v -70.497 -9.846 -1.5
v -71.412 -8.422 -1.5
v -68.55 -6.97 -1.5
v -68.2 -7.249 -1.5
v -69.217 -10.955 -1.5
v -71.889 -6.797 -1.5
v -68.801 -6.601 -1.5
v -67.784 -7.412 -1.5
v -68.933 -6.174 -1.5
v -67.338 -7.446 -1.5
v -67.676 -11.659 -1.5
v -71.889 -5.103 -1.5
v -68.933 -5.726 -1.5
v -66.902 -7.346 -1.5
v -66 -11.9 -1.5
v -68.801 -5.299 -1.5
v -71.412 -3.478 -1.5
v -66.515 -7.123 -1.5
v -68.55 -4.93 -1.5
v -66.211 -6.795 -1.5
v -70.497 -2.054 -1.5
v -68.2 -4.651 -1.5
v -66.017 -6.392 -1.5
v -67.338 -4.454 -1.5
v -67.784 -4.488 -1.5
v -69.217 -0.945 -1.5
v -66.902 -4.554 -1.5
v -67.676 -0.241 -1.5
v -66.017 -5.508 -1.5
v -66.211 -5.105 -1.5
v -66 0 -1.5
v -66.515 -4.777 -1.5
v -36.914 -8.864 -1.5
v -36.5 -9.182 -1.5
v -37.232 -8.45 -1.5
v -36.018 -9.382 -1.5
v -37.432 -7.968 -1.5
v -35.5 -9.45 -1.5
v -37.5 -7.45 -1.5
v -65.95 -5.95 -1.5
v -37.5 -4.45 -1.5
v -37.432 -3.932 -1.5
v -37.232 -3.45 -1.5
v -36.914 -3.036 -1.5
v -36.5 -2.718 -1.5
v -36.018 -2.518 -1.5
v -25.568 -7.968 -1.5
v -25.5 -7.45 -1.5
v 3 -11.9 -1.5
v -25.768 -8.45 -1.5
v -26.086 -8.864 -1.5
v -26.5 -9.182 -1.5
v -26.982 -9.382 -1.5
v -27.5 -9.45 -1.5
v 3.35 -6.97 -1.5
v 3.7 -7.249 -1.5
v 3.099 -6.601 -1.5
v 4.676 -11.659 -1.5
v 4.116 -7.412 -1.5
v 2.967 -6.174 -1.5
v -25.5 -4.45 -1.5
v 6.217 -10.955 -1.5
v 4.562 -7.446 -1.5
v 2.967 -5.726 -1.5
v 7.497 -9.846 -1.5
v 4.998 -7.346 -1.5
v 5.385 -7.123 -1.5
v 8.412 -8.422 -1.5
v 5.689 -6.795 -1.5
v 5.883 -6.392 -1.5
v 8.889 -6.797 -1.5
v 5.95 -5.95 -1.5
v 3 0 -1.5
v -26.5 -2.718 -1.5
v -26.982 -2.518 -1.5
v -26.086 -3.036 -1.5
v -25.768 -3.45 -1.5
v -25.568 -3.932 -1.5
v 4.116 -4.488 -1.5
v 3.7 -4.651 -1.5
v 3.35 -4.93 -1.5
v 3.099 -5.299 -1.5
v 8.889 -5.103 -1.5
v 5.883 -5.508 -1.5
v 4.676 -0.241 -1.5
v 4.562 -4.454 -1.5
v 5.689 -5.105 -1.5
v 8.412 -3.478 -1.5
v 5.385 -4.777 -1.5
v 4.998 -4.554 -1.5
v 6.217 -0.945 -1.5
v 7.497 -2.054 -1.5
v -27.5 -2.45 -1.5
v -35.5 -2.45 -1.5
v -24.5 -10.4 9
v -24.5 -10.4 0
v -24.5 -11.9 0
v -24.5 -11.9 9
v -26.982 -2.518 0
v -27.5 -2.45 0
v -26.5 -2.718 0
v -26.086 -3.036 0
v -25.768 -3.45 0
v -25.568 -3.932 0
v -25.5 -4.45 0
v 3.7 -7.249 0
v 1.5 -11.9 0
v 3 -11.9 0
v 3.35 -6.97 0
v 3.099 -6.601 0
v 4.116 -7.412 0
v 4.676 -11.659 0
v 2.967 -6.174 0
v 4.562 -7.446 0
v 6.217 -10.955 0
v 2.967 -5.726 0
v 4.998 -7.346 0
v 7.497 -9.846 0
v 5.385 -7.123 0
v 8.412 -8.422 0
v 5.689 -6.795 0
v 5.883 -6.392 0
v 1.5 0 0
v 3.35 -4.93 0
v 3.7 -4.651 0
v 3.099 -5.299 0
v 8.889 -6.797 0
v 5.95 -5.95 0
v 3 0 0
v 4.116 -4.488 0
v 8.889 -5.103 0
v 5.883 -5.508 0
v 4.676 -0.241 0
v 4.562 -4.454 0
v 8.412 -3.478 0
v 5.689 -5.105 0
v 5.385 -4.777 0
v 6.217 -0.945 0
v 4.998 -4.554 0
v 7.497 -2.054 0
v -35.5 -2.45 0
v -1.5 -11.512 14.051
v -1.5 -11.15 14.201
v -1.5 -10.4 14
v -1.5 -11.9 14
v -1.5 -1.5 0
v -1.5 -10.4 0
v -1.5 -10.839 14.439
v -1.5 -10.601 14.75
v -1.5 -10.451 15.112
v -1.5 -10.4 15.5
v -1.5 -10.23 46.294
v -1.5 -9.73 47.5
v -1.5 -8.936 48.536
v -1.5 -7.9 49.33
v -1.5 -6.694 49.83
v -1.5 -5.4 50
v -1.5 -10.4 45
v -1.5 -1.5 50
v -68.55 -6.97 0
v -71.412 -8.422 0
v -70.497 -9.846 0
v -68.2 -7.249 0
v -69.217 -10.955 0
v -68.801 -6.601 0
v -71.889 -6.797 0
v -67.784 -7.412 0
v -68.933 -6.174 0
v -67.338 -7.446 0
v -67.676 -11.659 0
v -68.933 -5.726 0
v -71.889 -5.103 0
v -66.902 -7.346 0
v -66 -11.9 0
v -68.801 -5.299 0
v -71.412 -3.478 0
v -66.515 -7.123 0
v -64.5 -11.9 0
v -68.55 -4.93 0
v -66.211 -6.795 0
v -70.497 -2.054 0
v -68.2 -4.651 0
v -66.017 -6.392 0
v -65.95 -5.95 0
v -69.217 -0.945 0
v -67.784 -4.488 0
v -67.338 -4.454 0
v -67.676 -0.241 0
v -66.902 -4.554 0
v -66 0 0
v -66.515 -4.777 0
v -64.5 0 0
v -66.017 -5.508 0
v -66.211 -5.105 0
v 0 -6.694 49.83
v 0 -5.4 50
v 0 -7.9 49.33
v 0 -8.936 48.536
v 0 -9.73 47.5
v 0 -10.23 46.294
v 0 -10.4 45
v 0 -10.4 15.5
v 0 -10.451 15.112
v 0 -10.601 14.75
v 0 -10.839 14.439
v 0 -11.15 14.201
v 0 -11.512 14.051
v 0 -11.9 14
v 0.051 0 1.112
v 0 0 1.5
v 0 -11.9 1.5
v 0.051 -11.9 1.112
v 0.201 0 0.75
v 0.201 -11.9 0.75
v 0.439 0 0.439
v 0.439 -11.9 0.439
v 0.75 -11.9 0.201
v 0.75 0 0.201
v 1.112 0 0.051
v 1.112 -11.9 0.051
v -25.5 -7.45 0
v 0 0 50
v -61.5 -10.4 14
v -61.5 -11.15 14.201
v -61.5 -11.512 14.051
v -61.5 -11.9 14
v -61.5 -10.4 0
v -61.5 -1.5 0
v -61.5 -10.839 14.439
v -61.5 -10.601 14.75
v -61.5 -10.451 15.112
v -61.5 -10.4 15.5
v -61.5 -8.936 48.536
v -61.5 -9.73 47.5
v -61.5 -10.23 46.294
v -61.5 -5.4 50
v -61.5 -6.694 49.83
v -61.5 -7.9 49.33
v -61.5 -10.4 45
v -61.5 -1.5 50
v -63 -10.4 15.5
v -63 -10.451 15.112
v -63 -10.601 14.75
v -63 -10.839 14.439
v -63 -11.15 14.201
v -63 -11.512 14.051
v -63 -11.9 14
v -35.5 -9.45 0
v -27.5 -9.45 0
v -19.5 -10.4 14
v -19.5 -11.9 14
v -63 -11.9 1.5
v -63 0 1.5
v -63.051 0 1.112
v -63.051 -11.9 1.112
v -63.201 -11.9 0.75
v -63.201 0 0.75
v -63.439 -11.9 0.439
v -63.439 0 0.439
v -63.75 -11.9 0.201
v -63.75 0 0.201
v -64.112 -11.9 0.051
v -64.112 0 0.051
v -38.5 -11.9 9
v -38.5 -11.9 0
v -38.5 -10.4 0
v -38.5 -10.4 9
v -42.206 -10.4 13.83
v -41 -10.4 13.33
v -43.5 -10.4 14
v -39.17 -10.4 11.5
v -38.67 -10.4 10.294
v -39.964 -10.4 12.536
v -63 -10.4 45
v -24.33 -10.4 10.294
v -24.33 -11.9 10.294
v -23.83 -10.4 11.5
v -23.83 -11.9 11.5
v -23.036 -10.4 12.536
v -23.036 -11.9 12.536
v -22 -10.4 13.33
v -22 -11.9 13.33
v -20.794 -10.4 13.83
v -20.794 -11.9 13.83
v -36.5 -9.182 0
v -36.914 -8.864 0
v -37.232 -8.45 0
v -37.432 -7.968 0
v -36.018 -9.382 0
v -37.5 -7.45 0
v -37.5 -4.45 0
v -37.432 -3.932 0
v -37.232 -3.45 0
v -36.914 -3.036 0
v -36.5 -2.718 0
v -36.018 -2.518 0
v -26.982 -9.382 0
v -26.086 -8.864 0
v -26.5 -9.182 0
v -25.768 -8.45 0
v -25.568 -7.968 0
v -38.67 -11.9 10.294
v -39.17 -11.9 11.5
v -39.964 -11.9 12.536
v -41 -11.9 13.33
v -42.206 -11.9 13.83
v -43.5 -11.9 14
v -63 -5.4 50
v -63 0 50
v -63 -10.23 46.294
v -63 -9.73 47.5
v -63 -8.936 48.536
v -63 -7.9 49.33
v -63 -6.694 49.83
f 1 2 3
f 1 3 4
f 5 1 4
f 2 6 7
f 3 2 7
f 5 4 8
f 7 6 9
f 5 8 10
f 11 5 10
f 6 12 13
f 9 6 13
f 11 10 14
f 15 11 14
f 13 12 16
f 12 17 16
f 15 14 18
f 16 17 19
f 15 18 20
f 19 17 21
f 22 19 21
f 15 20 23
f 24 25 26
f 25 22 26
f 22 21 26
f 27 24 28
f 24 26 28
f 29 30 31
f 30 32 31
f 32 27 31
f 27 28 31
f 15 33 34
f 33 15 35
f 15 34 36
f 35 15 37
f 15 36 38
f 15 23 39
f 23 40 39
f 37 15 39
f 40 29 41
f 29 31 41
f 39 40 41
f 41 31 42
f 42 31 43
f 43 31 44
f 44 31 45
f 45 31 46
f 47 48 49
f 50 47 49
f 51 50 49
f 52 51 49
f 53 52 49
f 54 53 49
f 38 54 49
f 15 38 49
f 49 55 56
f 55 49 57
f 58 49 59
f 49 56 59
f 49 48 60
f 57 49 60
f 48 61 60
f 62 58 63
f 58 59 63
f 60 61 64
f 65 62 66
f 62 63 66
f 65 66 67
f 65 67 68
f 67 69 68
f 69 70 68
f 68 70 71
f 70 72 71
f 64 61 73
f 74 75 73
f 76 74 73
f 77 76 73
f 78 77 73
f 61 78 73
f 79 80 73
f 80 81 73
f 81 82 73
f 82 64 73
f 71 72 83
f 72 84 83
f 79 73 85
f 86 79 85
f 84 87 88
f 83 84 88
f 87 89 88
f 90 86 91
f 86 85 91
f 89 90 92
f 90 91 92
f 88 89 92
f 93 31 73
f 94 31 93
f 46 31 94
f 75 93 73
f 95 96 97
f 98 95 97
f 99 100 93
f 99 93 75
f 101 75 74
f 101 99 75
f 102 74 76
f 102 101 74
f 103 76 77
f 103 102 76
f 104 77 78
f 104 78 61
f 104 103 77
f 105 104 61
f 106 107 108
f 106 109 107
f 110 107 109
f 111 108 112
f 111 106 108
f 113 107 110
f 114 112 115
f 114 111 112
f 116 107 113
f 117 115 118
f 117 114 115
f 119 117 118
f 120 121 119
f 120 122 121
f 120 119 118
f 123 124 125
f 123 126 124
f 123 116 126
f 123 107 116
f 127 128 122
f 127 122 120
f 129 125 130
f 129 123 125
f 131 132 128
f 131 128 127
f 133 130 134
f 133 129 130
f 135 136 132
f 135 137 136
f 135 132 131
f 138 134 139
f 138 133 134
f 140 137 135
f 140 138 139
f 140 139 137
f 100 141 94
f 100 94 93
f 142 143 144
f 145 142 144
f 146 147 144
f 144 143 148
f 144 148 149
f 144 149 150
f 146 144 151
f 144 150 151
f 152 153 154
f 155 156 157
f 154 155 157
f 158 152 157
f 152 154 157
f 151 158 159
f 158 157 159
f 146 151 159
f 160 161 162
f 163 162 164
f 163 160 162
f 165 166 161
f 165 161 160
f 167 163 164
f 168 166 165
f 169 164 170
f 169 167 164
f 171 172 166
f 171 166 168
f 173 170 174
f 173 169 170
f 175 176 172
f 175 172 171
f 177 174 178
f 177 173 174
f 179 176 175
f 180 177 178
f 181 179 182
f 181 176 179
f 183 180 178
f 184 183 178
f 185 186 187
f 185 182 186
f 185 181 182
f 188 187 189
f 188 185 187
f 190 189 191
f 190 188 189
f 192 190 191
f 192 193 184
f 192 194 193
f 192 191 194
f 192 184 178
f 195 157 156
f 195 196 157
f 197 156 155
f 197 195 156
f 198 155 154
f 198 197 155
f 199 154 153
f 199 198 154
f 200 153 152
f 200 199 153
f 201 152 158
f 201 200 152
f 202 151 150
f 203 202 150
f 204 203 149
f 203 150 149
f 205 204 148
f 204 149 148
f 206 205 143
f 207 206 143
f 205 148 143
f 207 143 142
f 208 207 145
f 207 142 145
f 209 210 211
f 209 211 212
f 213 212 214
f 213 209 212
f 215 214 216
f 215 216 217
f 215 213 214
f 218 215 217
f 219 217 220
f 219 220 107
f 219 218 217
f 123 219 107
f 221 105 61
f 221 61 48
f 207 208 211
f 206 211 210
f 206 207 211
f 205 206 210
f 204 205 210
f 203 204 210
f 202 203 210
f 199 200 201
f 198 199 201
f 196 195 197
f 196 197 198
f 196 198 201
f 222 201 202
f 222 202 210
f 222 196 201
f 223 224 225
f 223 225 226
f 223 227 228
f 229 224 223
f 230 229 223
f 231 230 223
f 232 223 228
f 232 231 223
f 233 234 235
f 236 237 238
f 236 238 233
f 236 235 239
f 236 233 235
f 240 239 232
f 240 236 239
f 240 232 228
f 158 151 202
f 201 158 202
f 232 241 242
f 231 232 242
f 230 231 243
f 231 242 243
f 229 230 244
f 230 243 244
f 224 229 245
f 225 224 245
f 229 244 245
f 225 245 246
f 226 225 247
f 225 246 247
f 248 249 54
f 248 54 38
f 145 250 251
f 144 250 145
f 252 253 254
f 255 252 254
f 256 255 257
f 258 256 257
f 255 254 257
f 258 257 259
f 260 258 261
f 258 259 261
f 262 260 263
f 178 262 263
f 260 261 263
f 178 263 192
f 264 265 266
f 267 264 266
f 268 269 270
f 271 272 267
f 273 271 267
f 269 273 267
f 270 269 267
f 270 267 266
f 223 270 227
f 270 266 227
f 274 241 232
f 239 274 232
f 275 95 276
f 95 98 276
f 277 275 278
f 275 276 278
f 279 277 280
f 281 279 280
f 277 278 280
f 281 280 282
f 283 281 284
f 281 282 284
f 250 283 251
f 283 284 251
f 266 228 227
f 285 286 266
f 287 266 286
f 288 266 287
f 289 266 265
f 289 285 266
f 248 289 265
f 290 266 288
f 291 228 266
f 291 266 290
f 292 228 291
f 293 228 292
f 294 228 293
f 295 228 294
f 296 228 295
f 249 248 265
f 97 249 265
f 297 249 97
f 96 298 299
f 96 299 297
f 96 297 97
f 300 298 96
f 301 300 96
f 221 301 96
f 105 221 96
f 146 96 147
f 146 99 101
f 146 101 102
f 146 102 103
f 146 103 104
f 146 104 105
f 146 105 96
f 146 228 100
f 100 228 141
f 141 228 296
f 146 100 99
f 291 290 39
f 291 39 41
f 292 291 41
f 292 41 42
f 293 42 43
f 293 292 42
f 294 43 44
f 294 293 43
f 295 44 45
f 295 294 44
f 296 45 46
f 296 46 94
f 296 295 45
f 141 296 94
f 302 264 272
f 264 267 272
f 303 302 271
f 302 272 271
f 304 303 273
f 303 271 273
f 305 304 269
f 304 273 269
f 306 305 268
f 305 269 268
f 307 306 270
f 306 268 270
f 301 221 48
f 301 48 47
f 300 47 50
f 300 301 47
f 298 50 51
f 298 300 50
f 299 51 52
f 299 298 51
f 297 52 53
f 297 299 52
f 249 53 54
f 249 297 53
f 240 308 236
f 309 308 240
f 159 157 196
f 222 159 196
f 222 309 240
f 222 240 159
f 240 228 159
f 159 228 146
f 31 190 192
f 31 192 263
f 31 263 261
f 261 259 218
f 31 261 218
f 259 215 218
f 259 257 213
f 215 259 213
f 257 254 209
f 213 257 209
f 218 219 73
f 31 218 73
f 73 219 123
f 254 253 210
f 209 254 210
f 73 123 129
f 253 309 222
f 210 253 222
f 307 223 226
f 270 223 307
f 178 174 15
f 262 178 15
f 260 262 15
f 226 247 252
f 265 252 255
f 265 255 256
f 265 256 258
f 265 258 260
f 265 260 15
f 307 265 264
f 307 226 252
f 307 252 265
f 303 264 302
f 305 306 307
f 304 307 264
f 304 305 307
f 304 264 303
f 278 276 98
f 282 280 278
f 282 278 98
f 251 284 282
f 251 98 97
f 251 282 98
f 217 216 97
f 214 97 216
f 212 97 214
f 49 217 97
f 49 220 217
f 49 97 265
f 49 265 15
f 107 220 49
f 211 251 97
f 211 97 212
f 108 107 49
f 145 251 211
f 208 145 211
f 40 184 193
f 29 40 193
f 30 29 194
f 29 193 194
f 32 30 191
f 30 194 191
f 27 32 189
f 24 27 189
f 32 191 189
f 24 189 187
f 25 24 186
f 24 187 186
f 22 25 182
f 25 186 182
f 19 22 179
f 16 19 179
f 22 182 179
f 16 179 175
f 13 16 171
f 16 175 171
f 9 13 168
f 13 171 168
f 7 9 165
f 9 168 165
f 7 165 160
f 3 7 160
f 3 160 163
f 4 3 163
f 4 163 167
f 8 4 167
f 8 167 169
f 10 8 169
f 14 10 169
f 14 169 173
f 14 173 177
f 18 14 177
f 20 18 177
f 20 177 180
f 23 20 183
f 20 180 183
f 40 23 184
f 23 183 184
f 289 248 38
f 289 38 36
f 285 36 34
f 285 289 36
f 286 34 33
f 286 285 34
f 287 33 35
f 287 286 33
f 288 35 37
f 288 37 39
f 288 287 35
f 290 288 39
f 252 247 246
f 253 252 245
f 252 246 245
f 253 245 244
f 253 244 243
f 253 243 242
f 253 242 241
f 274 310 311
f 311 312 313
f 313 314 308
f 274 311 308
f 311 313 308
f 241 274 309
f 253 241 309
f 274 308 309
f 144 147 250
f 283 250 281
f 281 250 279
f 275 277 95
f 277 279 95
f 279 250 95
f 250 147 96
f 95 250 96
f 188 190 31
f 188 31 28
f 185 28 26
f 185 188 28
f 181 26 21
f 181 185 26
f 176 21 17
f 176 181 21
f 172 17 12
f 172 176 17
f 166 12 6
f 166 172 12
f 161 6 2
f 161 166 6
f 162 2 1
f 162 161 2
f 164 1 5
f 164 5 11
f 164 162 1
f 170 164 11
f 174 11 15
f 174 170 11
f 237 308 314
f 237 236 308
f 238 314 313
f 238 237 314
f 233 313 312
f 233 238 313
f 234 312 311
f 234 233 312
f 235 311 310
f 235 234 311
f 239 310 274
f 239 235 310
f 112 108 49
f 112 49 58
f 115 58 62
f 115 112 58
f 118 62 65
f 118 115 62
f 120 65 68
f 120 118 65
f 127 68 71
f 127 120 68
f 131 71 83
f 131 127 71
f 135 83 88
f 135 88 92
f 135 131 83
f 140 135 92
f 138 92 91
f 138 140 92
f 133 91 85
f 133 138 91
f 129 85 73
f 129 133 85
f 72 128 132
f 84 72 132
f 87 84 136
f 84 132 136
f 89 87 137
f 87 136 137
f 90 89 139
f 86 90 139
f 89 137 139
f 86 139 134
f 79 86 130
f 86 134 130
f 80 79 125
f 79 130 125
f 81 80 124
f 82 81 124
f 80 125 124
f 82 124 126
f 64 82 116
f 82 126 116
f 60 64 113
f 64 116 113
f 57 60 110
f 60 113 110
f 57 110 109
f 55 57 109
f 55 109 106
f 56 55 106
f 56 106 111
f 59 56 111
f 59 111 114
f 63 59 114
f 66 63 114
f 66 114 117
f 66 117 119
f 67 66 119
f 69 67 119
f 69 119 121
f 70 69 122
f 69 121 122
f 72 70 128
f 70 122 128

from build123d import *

# Parameters (mm, degrees)
F1_W        = 14
F1_H        = 1.5
F1_R        = 1.5
F2_DEPTH    = 1.5
F3_DEPTH    = 14
F4_DEPTH    = 50
F5_R        = 5
F6_T1_DEPTH = 1.5
F6_T3_DEPTH = 11.9
F6_T5_DEPTH = 1.5


# Not quite as in the source:
# - a fillet or chamfer that OpenCascade refuses, or shapes differently, is made with other operations: its cross-section is extruded or revolved along the edge and cut away or added
# - a feature names something its author has since deleted; it is built from what else it names


with BuildPart() as f2:
    # F1 (on Top) → F2 (new body)
    with BuildSketch(Plane.XY):
        Polygon((-61.5, -10.4), (-61.5, -1.5), (-1.5, -1.5), (-1.5, -10.4), (0, -10.4), (0, 0), (-63, 0), (-63, -10.4), align=None)
        Polygon((-38.5, -10.4), (-61.5, -10.4), (-63, -10.4), (-63, -11.9), (-38.5, -11.9), align=None)
        with Locations((-31.5, -11.15)):
            Rectangle(F1_W, F1_H)
        Polygon((0, -10.4), (-1.5, -10.4), (-24.5, -10.4), (-24.5, -11.9), (0, -11.9), align=None)
        Polygon((-1.5, -1.5), (-61.5, -1.5), (-61.5, -10.4), (-38.5, -10.4), (-24.5, -10.4), (-1.5, -10.4), align=None)
        with BuildLine():
            ThreePointArc((-37.5, -4.45), (-36.9142135624, -3.0357864376), (-35.5, -2.45))
            Line((-35.5, -2.45), (-27.5, -2.45))
            ThreePointArc((-27.5, -2.45), (-26.0857864376, -3.0357864376), (-25.5, -4.45))
            Line((-25.5, -4.45), (-25.5, -7.45))
            ThreePointArc((-25.5, -7.45), (-26.0857864376, -8.8642135624), (-27.5, -9.45))
            Line((-27.5, -9.45), (-35.5, -9.45))
            ThreePointArc((-35.5, -9.45), (-36.9142135624, -8.8642135624), (-37.5, -7.45))
            Line((-37.5, -7.45), (-37.5, -4.45))
        make_face(mode=Mode.SUBTRACT)
        with BuildLine():
            Line((-63, -11.9), (-63, -10.4))
            Line((-63, -10.4), (-63, 0))
            Line((-63, 0), (-66, 0))
            ThreePointArc((-66, 0), (-71.95, -5.95), (-66, -11.9))
            Line((-66, -11.9), (-63, -11.9))
        make_face()
        with Locations((-67.45, -5.95)):
            Circle(F1_R, mode=Mode.SUBTRACT)
        with BuildLine():
            Line((0, 0), (0, -10.4))
            Line((0, -10.4), (0, -11.9))
            Line((0, -11.9), (3, -11.9))
            ThreePointArc((3, -11.9), (8.95, -5.95), (3, 0))
            Line((3, 0), (0, 0))
        make_face()
        with Locations((4.45, -5.95)):
            Circle(F1_R, mode=Mode.SUBTRACT)
    extrude(amount=-F2_DEPTH)

    # F1 (on Top) → F3 (join)
    with BuildSketch(Plane.XY):
        Polygon((0, -10.4), (-1.5, -10.4), (-24.5, -10.4), (-24.5, -11.9), (0, -11.9), align=None)
        Polygon((-38.5, -10.4), (-61.5, -10.4), (-63, -10.4), (-63, -11.9), (-38.5, -11.9), align=None)
    extrude(amount=F3_DEPTH)

    # F1 (on Top) → F4 (join)
    with BuildSketch(Plane.XY):
        Polygon((-61.5, -10.4), (-61.5, -1.5), (-1.5, -1.5), (-1.5, -10.4), (0, -10.4), (0, 0), (-63, 0), (-63, -10.4), align=None)
    extrude(amount=F4_DEPTH)

    # F5
    f5_edges = [f2.edges().sort_by_distance(p)[0] for p in [
        (-62.25, -10.4, 50),
        (-0.75, -10.4, 50),
        (-24.5, -11.15, 14),
        (-38.5, -11.15, 14),
    ]]
    fillet(f5_edges, radius=F5_R)

    # F6: fillet of radius 1.5 on 4 edges, made by hand

    # F6_s2 → F6_t1 (join)
    with BuildSketch(Plane.YZ.offset(-63)):
        with BuildLine():
            ThreePointArc((-10.4, 15.5), (-10.8393398282, 14.4393398282), (-11.9, 14))
            Line((-11.9, 14), (-10.4, 14))
            Line((-10.4, 14), (-10.4, 15.5))
        make_face()
    extrude(amount=F6_T1_DEPTH)

    # F6_s4 → F6_t3 (join)
    with BuildSketch(Plane.XZ):
        with BuildLine():
            ThreePointArc((-63, 1.5), (-63.4393398282, 0.4393398282), (-64.5, 0))
            Line((-64.5, 0), (-63, 0))
            Line((-63, 0), (-63, 1.5))
        make_face()
        with BuildLine():
            ThreePointArc((0, 1.5), (0.4393398282, 0.4393398282), (1.5, 0))
            Line((1.5, 0), (0, 0))
            Line((0, 0), (0, 1.5))
        make_face()
    extrude(amount=F6_T3_DEPTH)

    # F6_s6 → F6_t5 (join)
    with BuildSketch(Plane.YZ.offset(-1.5)):
        with BuildLine():
            ThreePointArc((-10.4, 15.5), (-10.8393398282, 14.4393398282), (-11.9, 14))
            Line((-11.9, 14), (-10.4, 14))
            Line((-10.4, 14), (-10.4, 15.5))
        make_face()
    extrude(amount=F6_T5_DEPTH)


solid = f2.part
